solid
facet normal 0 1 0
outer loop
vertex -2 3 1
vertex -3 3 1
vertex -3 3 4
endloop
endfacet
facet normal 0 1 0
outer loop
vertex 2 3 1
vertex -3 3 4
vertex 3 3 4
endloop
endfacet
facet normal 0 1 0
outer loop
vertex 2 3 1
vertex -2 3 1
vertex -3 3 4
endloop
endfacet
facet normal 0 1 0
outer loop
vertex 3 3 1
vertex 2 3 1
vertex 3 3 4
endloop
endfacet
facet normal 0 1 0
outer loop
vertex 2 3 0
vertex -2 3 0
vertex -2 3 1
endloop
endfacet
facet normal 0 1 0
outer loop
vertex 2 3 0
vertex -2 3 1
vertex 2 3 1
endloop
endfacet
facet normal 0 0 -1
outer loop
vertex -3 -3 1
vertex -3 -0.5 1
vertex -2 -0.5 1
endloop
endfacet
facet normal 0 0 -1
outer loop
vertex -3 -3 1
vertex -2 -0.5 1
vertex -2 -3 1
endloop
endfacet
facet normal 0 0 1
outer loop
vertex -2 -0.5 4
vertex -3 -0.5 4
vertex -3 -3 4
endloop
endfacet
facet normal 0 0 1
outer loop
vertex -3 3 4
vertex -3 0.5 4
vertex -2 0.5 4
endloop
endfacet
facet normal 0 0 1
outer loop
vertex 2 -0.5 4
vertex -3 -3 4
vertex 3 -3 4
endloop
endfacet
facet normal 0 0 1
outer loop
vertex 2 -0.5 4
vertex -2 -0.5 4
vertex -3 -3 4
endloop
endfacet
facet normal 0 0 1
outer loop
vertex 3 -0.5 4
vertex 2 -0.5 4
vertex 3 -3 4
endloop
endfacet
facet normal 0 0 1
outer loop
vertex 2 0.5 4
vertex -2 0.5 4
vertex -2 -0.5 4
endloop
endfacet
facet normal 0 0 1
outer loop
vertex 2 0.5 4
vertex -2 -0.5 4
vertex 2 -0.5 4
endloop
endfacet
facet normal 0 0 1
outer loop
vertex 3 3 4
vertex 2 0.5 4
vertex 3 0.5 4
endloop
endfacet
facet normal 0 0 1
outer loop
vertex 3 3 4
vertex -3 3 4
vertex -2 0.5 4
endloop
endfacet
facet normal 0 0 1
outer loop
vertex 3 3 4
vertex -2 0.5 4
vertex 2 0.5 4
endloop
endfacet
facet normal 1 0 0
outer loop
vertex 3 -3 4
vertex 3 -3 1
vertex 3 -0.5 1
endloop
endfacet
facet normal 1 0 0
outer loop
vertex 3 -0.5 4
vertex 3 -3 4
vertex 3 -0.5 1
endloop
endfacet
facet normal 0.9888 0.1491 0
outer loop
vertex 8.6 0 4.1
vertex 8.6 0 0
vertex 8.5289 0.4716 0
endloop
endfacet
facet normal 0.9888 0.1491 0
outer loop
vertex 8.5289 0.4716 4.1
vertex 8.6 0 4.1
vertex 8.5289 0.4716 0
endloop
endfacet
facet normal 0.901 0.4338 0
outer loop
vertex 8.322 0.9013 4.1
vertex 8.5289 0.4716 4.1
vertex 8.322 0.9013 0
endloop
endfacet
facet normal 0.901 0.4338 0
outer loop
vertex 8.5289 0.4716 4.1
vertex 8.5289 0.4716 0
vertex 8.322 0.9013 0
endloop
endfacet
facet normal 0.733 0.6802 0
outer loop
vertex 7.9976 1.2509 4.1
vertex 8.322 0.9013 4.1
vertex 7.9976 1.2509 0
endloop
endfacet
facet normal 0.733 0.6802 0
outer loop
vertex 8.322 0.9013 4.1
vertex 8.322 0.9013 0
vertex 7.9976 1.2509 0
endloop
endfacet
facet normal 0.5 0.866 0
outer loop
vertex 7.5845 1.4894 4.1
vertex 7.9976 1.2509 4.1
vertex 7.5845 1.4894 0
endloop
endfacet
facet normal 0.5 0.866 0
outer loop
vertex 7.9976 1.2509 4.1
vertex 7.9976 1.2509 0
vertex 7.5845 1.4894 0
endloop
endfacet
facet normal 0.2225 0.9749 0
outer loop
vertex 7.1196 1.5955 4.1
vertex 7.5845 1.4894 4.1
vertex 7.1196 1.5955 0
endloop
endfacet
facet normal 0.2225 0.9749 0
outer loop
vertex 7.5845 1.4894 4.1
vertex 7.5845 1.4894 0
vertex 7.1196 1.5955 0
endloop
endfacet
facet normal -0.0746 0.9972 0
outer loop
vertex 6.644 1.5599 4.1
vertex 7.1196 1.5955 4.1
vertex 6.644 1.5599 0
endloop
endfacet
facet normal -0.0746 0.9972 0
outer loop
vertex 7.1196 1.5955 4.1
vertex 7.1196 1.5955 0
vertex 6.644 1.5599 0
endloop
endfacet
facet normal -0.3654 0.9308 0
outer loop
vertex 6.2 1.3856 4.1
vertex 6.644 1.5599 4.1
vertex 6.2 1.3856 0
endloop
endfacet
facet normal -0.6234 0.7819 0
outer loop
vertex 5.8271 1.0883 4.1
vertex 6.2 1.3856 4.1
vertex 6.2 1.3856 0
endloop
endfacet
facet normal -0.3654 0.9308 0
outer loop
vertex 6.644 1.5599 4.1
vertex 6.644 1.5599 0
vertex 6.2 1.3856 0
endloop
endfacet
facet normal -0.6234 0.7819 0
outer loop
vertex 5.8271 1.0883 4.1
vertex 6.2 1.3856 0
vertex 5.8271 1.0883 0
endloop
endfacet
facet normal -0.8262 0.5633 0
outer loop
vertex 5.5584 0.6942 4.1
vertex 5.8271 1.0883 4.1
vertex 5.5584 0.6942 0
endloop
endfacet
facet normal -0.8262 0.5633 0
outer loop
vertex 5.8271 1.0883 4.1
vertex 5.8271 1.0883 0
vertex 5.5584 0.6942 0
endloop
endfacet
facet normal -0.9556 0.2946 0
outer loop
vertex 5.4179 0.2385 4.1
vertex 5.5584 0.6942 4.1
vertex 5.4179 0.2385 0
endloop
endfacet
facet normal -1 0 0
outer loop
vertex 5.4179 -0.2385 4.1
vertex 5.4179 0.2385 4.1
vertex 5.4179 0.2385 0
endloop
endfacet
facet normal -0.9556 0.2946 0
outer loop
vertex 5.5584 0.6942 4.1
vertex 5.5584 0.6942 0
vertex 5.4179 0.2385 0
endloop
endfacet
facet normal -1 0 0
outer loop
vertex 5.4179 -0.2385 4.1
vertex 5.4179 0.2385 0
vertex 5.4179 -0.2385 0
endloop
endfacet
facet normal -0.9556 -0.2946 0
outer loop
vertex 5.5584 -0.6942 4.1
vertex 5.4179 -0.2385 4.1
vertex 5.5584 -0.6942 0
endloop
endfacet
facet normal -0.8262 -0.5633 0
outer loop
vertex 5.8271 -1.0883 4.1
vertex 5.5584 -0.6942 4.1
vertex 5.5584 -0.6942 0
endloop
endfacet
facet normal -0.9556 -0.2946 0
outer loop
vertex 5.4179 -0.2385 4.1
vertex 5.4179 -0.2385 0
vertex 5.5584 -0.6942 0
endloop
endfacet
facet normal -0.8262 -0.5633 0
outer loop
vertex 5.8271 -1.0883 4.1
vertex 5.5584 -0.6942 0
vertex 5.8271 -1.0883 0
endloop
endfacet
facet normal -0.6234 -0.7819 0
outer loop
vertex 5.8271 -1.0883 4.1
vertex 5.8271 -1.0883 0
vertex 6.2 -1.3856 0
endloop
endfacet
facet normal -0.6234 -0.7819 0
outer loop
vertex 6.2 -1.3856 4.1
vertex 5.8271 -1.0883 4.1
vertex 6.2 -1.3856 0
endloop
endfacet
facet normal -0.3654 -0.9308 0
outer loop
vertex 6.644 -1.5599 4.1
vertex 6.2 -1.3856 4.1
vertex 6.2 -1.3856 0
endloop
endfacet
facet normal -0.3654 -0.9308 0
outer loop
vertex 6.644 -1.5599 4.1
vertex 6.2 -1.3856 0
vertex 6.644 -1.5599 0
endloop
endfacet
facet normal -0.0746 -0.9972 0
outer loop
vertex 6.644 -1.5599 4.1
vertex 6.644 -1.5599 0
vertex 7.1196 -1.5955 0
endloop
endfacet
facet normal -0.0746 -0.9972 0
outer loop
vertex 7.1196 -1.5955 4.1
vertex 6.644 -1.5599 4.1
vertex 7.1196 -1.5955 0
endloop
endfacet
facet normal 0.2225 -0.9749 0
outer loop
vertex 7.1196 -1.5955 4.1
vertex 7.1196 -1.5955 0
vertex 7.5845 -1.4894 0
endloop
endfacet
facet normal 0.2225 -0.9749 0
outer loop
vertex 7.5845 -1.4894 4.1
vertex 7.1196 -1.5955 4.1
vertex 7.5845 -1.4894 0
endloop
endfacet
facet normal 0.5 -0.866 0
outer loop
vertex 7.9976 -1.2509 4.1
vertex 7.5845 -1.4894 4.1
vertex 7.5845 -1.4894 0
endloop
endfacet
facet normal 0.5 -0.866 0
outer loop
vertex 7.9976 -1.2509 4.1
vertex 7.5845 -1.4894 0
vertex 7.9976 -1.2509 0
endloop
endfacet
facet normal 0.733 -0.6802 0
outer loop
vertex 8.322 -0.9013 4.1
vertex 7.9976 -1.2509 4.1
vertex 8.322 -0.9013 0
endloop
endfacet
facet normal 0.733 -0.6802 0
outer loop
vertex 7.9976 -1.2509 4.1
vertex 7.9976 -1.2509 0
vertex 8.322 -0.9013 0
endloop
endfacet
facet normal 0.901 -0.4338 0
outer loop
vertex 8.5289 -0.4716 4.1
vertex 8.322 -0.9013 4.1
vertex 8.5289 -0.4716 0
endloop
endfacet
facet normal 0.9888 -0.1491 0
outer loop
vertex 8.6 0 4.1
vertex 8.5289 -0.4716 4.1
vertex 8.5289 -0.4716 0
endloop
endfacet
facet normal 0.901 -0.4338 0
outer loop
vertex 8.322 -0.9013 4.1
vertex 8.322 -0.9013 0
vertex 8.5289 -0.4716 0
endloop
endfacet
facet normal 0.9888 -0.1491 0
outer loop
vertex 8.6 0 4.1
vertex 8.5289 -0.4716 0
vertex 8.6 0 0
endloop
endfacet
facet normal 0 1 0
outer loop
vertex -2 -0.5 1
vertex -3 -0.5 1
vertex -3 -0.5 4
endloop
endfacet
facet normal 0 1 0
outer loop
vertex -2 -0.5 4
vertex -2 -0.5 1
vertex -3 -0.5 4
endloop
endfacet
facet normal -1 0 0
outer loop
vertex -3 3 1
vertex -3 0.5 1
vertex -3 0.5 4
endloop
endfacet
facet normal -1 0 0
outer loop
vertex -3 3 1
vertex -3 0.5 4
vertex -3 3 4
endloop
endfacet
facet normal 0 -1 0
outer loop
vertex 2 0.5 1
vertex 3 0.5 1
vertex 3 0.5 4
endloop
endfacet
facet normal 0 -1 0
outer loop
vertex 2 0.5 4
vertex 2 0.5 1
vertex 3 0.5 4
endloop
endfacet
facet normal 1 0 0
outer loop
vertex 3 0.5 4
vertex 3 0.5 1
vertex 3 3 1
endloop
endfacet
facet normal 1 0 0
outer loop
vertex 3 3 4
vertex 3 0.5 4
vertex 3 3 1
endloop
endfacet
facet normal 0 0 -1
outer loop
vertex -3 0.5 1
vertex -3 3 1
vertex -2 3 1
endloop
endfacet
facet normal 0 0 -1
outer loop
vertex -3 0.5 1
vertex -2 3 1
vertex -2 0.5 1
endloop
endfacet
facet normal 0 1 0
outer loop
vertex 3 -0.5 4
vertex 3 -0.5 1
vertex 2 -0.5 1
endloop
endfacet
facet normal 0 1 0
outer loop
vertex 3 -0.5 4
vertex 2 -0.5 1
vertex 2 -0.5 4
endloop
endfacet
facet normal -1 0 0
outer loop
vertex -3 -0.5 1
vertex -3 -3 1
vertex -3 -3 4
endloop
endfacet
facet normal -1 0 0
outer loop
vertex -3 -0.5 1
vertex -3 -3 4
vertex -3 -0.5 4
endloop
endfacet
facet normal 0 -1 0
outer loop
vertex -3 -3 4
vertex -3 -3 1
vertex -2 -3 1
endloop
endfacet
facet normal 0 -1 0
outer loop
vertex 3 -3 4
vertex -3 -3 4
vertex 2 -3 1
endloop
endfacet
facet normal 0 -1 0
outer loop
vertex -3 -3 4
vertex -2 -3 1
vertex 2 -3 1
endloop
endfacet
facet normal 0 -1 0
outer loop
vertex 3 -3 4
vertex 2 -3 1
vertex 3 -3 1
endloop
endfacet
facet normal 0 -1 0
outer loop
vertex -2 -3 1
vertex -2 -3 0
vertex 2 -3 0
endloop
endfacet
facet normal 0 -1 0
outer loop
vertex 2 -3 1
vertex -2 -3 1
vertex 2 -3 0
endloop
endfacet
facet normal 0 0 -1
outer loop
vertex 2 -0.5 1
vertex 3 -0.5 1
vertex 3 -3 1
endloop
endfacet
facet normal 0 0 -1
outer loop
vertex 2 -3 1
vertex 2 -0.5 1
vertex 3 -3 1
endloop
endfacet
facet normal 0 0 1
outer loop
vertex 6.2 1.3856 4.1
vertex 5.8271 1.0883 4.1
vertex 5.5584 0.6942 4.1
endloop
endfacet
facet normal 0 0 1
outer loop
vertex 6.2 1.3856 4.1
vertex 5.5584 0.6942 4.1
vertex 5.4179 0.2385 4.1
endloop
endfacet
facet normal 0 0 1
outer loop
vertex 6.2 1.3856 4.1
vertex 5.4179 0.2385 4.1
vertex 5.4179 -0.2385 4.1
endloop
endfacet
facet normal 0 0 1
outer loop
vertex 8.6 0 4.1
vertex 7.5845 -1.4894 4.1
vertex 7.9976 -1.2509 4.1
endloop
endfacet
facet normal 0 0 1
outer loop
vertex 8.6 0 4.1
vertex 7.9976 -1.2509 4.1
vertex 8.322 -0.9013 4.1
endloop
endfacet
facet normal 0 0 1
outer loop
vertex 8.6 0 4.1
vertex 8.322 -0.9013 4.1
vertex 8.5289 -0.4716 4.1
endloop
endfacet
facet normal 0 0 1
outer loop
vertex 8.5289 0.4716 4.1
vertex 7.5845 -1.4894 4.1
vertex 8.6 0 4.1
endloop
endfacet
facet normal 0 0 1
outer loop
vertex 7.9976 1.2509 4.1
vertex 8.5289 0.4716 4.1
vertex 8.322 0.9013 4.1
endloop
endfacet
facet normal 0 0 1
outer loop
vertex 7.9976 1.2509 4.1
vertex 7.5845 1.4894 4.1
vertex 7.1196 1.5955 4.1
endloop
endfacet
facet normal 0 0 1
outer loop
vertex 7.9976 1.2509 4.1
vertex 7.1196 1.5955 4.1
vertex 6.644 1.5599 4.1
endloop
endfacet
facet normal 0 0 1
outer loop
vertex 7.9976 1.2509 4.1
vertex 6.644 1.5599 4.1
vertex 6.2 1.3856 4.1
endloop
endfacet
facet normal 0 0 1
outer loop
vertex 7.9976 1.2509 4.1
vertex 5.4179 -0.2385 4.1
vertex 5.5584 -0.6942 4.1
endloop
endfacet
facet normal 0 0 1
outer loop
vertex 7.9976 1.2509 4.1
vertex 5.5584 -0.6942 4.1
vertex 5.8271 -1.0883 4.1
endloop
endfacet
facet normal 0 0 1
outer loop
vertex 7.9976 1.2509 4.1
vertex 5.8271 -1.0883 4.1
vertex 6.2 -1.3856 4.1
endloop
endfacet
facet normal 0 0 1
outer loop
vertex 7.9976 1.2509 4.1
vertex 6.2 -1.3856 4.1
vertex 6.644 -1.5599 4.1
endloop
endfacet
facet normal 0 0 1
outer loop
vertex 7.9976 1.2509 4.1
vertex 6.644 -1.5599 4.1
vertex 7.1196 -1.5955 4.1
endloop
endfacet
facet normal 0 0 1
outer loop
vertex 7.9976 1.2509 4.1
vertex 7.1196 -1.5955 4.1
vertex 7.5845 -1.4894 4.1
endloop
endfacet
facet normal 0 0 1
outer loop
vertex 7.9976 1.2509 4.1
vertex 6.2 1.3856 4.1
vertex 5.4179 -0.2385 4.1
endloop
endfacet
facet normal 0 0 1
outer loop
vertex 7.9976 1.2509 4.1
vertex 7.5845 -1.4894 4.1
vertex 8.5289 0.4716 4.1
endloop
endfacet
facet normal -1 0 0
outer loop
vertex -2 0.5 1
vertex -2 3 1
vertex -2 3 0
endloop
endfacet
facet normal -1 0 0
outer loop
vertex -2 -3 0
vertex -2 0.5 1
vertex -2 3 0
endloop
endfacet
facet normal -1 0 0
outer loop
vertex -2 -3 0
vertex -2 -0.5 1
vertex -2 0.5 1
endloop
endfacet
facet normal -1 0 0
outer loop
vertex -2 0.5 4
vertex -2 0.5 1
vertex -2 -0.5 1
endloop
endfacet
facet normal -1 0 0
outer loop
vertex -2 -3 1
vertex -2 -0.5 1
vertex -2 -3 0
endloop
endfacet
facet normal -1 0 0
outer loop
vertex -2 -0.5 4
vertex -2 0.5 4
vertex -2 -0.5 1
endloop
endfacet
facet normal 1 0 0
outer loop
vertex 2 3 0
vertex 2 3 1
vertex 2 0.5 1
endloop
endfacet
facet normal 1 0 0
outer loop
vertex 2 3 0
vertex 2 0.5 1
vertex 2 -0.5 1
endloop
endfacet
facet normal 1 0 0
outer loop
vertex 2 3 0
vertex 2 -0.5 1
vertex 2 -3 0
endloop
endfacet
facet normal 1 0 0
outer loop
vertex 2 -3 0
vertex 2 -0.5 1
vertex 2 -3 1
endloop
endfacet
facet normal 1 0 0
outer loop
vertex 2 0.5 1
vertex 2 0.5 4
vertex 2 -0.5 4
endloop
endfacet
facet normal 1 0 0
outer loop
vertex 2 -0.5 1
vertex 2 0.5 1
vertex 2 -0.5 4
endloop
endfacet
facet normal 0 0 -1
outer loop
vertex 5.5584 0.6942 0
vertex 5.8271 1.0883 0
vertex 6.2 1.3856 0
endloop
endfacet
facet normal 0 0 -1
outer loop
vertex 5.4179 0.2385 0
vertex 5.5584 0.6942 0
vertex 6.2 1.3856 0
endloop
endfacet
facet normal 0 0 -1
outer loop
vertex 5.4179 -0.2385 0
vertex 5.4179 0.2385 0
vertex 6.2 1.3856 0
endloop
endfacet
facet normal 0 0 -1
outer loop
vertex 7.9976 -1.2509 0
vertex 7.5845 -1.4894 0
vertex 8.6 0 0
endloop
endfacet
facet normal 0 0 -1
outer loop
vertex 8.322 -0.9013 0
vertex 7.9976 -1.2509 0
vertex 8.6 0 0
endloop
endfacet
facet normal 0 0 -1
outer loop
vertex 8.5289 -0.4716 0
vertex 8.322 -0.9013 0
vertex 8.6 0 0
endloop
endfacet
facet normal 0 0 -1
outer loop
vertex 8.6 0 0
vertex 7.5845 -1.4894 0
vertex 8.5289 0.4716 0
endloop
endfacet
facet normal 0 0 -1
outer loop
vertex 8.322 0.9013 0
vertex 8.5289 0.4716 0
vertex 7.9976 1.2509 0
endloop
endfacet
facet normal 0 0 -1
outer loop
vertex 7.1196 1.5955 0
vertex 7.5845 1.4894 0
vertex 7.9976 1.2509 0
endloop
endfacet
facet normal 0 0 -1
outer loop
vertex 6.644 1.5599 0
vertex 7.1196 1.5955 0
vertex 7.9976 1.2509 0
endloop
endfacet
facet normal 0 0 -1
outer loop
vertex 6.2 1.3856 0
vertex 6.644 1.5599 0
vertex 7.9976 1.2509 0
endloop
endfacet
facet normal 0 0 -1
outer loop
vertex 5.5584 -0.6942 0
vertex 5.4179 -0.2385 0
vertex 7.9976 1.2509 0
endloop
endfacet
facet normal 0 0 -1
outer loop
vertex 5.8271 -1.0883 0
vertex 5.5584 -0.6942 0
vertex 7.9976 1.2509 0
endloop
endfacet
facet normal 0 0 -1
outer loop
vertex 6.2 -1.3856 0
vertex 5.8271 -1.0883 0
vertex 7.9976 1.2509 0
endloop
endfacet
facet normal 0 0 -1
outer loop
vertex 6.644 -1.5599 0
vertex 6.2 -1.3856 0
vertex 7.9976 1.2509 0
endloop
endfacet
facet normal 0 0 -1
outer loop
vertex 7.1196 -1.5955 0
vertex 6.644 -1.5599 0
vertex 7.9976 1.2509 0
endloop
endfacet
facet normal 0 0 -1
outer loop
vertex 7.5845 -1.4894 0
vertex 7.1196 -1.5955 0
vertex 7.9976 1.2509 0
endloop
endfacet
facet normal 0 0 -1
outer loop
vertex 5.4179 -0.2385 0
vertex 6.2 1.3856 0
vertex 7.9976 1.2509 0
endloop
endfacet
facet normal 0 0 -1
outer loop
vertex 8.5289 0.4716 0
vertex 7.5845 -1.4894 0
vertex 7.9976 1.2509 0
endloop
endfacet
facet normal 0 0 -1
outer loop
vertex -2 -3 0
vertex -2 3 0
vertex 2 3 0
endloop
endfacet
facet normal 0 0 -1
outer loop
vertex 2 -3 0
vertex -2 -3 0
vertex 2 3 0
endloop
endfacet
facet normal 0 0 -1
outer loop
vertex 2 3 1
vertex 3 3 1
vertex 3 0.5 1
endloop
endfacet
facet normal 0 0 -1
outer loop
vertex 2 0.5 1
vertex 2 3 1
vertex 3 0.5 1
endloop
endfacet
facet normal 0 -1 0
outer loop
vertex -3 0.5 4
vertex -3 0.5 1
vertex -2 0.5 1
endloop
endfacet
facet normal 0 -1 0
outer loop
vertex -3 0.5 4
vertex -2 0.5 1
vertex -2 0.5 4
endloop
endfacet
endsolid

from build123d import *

# Parameters (mm, degrees)
SKETCH_W        = 6
SKETCH_H        = 6
PAD_DEPTH       = 4
SKETCH002_W     = 1
SKETCH002_H     = 4
POCKET_DEPTH    = 1
SKETCH003_W     = 6
SKETCH003_H     = 1
POCKET001_DEPTH = 1
SKETCH001_R     = 1.6
PAD001_DEPTH    = 4.1


with BuildPart() as body:
    # Sketch → Pad (new body)
    with BuildSketch(Plane.XY):
        Rectangle(SKETCH_W, SKETCH_H)
    extrude(amount=PAD_DEPTH)

    # Sketch002 (on Face4 of Pad) → Pocket (cut)
    with BuildSketch(Plane(origin=(-3, 0, 0), x_dir=(0, -1, 0), z_dir=(-1, 0, 0))):
        with Locations((0, 2)):
            Rectangle(SKETCH002_W, SKETCH002_H)
    pocket = extrude(amount=-POCKET_DEPTH, mode=Mode.SUBTRACT)

    # Mirrored: Pocket across YZ
    add(pocket.mirror(Plane.YZ), mode=Mode.SUBTRACT)

    # Sketch003 (on Face12 of Mirrored) → Pocket001 (cut)
    with BuildSketch(Plane(origin=(-3, 0, 0), x_dir=(0, -1, 0), z_dir=(-1, 0, 0))):
        with Locations((0, 0.5)):
            Rectangle(SKETCH003_W, SKETCH003_H)
    pocket001 = extrude(amount=-POCKET001_DEPTH, mode=Mode.SUBTRACT)

    # Mirrored001: Pocket001 across YZ
    add(pocket001.mirror(Plane.YZ), mode=Mode.SUBTRACT)


with BuildPart() as body001:
    # Sketch001 → Pad001 (new body)
    with BuildSketch(Plane.XY):
        with Locations((7, 0)):
            Circle(SKETCH001_R)
    extrude(amount=PAD001_DEPTH)


solid = Compound([body.part, body001.part])
